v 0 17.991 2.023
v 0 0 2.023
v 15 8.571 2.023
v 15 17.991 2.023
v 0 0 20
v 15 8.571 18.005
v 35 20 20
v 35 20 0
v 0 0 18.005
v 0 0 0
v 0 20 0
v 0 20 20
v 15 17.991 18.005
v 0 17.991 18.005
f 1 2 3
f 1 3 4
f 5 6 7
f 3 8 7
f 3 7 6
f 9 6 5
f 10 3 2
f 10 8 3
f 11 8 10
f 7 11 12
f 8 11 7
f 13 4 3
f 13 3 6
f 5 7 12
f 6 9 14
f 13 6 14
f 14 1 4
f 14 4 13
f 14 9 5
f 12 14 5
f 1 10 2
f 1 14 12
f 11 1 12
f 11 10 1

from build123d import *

# Parameters (mm, degrees)
BOSS_EXTRUDE1_DEPTH = 20
SKETCH2_W           = 15.981748592
SKETCH2_H           = 17.990874296
CUT_EXTRUDE1_DEPTH  = 15


with BuildPart() as part:
    # Sketch1 → Boss-Extrude1 (new body)
    with BuildSketch(Plane.XY):
        Polygon((0, 0), (0, 20), (35, 20), align=None)
    extrude(amount=BOSS_EXTRUDE1_DEPTH)

    # Sketch2 → Cut-Extrude1 (cut)
    with BuildSketch(Plane.ZY):
        with Locations((10.013945679, 8.995437148)):
            Rectangle(SKETCH2_W, SKETCH2_H)
    extrude(amount=-CUT_EXTRUDE1_DEPTH, mode=Mode.SUBTRACT)


solid = part.part
